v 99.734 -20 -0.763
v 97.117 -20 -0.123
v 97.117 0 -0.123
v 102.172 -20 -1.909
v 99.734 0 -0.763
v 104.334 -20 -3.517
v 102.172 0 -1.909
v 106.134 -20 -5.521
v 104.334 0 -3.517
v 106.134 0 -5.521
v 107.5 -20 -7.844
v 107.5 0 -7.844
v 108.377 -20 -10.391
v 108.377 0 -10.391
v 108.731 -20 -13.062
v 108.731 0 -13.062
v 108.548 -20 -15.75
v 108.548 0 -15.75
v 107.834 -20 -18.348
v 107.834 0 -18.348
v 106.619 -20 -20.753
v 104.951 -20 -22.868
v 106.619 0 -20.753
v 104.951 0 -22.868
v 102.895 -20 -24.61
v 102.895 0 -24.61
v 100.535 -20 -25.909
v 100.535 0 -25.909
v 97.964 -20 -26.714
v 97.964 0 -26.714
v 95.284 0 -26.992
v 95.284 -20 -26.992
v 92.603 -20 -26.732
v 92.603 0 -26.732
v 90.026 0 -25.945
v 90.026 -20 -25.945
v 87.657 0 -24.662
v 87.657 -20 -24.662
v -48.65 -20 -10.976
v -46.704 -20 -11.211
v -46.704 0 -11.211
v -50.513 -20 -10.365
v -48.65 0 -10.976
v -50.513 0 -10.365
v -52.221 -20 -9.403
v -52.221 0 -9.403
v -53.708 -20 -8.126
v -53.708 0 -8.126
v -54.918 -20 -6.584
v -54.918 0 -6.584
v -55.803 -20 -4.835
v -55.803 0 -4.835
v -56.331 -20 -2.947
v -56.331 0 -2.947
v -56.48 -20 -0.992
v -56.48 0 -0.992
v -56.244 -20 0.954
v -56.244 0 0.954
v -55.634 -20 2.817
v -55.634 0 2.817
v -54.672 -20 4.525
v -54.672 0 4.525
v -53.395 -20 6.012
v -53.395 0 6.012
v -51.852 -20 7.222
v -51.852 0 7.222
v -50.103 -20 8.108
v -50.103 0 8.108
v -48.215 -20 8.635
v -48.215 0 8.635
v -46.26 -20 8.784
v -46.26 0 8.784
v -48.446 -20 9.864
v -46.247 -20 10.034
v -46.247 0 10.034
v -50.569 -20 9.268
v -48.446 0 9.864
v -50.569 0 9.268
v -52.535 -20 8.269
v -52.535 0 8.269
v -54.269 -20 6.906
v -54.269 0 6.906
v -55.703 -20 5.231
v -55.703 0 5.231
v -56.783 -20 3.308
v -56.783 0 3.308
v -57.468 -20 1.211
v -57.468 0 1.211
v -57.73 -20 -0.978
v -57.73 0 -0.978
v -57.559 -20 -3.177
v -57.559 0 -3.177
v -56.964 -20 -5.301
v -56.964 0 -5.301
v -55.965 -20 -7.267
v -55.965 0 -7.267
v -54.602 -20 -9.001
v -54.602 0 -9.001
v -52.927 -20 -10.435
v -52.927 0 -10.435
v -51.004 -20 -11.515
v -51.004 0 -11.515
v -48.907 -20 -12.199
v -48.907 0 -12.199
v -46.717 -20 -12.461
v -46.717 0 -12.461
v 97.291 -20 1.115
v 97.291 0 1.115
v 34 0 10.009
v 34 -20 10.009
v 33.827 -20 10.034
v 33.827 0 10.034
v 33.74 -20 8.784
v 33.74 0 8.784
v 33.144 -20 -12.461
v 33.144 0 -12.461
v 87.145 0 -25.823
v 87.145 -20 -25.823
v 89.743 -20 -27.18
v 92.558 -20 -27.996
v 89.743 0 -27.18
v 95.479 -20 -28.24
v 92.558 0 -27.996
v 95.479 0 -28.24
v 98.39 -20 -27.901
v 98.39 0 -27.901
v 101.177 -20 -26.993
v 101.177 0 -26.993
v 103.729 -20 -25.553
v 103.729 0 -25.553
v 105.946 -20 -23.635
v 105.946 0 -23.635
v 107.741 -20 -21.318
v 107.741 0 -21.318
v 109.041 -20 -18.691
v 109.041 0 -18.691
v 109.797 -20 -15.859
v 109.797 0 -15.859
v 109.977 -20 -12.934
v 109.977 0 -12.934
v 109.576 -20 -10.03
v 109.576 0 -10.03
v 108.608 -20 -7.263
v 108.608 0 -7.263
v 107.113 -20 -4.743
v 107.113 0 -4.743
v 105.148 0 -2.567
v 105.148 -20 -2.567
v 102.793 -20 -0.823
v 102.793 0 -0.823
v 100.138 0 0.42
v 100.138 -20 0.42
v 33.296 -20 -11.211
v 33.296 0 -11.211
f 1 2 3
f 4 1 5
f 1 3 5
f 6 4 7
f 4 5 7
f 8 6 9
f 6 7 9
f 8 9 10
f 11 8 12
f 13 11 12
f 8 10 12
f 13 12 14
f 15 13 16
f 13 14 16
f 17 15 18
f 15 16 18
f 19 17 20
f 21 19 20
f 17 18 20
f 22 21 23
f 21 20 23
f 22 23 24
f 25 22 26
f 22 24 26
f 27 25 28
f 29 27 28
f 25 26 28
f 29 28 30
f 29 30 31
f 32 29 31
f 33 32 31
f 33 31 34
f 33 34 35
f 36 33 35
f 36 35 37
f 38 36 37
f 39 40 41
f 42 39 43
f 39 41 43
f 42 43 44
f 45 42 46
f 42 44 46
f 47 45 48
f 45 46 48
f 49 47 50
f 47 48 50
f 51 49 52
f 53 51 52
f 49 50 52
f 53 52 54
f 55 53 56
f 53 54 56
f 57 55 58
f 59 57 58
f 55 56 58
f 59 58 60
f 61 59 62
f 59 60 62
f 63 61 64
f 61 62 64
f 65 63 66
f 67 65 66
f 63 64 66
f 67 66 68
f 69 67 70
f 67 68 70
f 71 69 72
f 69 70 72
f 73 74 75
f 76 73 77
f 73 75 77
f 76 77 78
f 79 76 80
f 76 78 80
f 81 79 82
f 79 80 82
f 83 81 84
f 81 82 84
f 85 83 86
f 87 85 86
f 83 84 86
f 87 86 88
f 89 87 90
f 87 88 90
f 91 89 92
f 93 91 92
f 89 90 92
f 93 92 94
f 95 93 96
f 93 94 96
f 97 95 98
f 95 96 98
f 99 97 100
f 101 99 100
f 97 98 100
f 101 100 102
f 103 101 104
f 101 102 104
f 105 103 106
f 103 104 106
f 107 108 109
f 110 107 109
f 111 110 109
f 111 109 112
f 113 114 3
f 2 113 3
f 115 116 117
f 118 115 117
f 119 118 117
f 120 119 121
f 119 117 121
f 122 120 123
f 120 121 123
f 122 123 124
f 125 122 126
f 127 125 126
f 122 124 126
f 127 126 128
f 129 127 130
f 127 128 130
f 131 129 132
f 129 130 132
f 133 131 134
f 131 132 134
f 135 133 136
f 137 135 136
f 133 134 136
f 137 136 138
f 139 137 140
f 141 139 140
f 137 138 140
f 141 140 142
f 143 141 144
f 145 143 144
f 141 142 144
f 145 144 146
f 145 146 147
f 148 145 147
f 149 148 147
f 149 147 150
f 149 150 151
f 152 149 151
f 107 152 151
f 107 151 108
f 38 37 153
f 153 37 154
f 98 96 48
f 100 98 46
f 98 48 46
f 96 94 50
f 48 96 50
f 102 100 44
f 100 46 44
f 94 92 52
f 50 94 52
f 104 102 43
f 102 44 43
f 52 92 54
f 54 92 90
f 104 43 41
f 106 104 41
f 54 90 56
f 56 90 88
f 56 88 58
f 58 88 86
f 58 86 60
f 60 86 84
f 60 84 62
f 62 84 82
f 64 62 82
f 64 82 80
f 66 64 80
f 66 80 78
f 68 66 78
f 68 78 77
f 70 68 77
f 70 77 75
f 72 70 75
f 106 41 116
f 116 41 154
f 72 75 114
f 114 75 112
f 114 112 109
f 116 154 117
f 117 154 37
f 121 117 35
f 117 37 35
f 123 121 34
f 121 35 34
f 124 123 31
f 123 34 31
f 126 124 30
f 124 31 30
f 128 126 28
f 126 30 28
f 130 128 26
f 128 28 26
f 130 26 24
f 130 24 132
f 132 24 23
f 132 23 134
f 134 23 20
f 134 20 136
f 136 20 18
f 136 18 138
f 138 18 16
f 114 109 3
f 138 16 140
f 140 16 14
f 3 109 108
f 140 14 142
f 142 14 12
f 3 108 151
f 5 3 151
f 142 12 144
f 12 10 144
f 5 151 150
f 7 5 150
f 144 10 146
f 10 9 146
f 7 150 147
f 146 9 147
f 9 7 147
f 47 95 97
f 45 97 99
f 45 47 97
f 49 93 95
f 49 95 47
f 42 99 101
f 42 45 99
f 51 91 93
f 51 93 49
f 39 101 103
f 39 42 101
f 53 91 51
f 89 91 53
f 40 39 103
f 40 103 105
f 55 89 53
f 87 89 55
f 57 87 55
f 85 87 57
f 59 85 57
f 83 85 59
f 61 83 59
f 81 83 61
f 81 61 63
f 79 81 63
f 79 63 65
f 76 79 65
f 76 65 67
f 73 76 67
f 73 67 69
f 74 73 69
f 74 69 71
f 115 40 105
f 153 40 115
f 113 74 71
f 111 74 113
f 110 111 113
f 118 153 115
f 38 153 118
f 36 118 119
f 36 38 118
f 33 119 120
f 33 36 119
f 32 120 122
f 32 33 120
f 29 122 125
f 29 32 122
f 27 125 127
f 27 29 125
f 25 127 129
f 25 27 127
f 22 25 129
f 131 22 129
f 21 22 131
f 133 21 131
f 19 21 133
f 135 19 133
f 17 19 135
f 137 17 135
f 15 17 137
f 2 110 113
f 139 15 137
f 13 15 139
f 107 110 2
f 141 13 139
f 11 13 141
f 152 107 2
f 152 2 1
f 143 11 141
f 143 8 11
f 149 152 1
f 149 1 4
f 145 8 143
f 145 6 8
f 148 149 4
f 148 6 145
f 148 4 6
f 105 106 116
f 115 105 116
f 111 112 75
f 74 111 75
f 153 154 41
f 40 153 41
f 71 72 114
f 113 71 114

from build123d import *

# Parameters (mm, degrees)
F1_DEPTH = 20


# Not quite as in the source:
# - ends of sketch curves that miss each other by under 0.0002 mm in the source are joined


with BuildPart() as f1:
    # F0 (on Front) → F1 (new body)
    with BuildSketch(Plane.XZ):
        with BuildLine():
            Line((97.2907843779, 1.1145511836), (34.0001858397, 10.009464731))
            Line((34.0001858397, 10.009464731), (33.8270701172, 10.0337945591))
            Line((33.8270701172, 10.0337945591), (33.7396616023, 10.0337945591))
            Line((33.7396616023, 10.0337945591), (-46.2468009406, 10.0337945591))
            ThreePointArc((-46.2468009406, 10.0337945591), (-57.7296417452, -0.9784425912), (-46.7174045949, -12.4612833958))
            Line((-46.7174045949, -12.4612833958), (33.1437814598, -12.4612833958))
            Line((33.1437814598, -12.4612833958), (87.1445596341, -25.8231245195))
            ThreePointArc((87.1445596341, -25.8231245195), (109.0413090103, -18.6910027208), (97.2907843779, 1.1145511836))
        make_face()
        with BuildLine():
            ThreePointArc((-46.7038671765, -11.2112851433), (-56.4796434927, -0.9919800096), (-46.260338359, 8.7837963066))
            Line((-46.260338359, 8.7837963066), (33.7396616023, 8.7837945591))
            Line((33.7396616023, 8.7837945591), (97.1168180017, -0.1232839023))
            ThreePointArc((97.1168180017, -0.1232839023), (107.8343480434, -18.3479856965), (87.6567253878, -24.6621562401))
            Line((87.6567253878, -24.6621562401), (33.2961328623, -11.2112833958))
            Line((33.2961328623, -11.2112833958), (-46.7038671765, -11.2112851433))
        make_face(mode=Mode.SUBTRACT)
    extrude(amount=F1_DEPTH)


solid = f1.part
